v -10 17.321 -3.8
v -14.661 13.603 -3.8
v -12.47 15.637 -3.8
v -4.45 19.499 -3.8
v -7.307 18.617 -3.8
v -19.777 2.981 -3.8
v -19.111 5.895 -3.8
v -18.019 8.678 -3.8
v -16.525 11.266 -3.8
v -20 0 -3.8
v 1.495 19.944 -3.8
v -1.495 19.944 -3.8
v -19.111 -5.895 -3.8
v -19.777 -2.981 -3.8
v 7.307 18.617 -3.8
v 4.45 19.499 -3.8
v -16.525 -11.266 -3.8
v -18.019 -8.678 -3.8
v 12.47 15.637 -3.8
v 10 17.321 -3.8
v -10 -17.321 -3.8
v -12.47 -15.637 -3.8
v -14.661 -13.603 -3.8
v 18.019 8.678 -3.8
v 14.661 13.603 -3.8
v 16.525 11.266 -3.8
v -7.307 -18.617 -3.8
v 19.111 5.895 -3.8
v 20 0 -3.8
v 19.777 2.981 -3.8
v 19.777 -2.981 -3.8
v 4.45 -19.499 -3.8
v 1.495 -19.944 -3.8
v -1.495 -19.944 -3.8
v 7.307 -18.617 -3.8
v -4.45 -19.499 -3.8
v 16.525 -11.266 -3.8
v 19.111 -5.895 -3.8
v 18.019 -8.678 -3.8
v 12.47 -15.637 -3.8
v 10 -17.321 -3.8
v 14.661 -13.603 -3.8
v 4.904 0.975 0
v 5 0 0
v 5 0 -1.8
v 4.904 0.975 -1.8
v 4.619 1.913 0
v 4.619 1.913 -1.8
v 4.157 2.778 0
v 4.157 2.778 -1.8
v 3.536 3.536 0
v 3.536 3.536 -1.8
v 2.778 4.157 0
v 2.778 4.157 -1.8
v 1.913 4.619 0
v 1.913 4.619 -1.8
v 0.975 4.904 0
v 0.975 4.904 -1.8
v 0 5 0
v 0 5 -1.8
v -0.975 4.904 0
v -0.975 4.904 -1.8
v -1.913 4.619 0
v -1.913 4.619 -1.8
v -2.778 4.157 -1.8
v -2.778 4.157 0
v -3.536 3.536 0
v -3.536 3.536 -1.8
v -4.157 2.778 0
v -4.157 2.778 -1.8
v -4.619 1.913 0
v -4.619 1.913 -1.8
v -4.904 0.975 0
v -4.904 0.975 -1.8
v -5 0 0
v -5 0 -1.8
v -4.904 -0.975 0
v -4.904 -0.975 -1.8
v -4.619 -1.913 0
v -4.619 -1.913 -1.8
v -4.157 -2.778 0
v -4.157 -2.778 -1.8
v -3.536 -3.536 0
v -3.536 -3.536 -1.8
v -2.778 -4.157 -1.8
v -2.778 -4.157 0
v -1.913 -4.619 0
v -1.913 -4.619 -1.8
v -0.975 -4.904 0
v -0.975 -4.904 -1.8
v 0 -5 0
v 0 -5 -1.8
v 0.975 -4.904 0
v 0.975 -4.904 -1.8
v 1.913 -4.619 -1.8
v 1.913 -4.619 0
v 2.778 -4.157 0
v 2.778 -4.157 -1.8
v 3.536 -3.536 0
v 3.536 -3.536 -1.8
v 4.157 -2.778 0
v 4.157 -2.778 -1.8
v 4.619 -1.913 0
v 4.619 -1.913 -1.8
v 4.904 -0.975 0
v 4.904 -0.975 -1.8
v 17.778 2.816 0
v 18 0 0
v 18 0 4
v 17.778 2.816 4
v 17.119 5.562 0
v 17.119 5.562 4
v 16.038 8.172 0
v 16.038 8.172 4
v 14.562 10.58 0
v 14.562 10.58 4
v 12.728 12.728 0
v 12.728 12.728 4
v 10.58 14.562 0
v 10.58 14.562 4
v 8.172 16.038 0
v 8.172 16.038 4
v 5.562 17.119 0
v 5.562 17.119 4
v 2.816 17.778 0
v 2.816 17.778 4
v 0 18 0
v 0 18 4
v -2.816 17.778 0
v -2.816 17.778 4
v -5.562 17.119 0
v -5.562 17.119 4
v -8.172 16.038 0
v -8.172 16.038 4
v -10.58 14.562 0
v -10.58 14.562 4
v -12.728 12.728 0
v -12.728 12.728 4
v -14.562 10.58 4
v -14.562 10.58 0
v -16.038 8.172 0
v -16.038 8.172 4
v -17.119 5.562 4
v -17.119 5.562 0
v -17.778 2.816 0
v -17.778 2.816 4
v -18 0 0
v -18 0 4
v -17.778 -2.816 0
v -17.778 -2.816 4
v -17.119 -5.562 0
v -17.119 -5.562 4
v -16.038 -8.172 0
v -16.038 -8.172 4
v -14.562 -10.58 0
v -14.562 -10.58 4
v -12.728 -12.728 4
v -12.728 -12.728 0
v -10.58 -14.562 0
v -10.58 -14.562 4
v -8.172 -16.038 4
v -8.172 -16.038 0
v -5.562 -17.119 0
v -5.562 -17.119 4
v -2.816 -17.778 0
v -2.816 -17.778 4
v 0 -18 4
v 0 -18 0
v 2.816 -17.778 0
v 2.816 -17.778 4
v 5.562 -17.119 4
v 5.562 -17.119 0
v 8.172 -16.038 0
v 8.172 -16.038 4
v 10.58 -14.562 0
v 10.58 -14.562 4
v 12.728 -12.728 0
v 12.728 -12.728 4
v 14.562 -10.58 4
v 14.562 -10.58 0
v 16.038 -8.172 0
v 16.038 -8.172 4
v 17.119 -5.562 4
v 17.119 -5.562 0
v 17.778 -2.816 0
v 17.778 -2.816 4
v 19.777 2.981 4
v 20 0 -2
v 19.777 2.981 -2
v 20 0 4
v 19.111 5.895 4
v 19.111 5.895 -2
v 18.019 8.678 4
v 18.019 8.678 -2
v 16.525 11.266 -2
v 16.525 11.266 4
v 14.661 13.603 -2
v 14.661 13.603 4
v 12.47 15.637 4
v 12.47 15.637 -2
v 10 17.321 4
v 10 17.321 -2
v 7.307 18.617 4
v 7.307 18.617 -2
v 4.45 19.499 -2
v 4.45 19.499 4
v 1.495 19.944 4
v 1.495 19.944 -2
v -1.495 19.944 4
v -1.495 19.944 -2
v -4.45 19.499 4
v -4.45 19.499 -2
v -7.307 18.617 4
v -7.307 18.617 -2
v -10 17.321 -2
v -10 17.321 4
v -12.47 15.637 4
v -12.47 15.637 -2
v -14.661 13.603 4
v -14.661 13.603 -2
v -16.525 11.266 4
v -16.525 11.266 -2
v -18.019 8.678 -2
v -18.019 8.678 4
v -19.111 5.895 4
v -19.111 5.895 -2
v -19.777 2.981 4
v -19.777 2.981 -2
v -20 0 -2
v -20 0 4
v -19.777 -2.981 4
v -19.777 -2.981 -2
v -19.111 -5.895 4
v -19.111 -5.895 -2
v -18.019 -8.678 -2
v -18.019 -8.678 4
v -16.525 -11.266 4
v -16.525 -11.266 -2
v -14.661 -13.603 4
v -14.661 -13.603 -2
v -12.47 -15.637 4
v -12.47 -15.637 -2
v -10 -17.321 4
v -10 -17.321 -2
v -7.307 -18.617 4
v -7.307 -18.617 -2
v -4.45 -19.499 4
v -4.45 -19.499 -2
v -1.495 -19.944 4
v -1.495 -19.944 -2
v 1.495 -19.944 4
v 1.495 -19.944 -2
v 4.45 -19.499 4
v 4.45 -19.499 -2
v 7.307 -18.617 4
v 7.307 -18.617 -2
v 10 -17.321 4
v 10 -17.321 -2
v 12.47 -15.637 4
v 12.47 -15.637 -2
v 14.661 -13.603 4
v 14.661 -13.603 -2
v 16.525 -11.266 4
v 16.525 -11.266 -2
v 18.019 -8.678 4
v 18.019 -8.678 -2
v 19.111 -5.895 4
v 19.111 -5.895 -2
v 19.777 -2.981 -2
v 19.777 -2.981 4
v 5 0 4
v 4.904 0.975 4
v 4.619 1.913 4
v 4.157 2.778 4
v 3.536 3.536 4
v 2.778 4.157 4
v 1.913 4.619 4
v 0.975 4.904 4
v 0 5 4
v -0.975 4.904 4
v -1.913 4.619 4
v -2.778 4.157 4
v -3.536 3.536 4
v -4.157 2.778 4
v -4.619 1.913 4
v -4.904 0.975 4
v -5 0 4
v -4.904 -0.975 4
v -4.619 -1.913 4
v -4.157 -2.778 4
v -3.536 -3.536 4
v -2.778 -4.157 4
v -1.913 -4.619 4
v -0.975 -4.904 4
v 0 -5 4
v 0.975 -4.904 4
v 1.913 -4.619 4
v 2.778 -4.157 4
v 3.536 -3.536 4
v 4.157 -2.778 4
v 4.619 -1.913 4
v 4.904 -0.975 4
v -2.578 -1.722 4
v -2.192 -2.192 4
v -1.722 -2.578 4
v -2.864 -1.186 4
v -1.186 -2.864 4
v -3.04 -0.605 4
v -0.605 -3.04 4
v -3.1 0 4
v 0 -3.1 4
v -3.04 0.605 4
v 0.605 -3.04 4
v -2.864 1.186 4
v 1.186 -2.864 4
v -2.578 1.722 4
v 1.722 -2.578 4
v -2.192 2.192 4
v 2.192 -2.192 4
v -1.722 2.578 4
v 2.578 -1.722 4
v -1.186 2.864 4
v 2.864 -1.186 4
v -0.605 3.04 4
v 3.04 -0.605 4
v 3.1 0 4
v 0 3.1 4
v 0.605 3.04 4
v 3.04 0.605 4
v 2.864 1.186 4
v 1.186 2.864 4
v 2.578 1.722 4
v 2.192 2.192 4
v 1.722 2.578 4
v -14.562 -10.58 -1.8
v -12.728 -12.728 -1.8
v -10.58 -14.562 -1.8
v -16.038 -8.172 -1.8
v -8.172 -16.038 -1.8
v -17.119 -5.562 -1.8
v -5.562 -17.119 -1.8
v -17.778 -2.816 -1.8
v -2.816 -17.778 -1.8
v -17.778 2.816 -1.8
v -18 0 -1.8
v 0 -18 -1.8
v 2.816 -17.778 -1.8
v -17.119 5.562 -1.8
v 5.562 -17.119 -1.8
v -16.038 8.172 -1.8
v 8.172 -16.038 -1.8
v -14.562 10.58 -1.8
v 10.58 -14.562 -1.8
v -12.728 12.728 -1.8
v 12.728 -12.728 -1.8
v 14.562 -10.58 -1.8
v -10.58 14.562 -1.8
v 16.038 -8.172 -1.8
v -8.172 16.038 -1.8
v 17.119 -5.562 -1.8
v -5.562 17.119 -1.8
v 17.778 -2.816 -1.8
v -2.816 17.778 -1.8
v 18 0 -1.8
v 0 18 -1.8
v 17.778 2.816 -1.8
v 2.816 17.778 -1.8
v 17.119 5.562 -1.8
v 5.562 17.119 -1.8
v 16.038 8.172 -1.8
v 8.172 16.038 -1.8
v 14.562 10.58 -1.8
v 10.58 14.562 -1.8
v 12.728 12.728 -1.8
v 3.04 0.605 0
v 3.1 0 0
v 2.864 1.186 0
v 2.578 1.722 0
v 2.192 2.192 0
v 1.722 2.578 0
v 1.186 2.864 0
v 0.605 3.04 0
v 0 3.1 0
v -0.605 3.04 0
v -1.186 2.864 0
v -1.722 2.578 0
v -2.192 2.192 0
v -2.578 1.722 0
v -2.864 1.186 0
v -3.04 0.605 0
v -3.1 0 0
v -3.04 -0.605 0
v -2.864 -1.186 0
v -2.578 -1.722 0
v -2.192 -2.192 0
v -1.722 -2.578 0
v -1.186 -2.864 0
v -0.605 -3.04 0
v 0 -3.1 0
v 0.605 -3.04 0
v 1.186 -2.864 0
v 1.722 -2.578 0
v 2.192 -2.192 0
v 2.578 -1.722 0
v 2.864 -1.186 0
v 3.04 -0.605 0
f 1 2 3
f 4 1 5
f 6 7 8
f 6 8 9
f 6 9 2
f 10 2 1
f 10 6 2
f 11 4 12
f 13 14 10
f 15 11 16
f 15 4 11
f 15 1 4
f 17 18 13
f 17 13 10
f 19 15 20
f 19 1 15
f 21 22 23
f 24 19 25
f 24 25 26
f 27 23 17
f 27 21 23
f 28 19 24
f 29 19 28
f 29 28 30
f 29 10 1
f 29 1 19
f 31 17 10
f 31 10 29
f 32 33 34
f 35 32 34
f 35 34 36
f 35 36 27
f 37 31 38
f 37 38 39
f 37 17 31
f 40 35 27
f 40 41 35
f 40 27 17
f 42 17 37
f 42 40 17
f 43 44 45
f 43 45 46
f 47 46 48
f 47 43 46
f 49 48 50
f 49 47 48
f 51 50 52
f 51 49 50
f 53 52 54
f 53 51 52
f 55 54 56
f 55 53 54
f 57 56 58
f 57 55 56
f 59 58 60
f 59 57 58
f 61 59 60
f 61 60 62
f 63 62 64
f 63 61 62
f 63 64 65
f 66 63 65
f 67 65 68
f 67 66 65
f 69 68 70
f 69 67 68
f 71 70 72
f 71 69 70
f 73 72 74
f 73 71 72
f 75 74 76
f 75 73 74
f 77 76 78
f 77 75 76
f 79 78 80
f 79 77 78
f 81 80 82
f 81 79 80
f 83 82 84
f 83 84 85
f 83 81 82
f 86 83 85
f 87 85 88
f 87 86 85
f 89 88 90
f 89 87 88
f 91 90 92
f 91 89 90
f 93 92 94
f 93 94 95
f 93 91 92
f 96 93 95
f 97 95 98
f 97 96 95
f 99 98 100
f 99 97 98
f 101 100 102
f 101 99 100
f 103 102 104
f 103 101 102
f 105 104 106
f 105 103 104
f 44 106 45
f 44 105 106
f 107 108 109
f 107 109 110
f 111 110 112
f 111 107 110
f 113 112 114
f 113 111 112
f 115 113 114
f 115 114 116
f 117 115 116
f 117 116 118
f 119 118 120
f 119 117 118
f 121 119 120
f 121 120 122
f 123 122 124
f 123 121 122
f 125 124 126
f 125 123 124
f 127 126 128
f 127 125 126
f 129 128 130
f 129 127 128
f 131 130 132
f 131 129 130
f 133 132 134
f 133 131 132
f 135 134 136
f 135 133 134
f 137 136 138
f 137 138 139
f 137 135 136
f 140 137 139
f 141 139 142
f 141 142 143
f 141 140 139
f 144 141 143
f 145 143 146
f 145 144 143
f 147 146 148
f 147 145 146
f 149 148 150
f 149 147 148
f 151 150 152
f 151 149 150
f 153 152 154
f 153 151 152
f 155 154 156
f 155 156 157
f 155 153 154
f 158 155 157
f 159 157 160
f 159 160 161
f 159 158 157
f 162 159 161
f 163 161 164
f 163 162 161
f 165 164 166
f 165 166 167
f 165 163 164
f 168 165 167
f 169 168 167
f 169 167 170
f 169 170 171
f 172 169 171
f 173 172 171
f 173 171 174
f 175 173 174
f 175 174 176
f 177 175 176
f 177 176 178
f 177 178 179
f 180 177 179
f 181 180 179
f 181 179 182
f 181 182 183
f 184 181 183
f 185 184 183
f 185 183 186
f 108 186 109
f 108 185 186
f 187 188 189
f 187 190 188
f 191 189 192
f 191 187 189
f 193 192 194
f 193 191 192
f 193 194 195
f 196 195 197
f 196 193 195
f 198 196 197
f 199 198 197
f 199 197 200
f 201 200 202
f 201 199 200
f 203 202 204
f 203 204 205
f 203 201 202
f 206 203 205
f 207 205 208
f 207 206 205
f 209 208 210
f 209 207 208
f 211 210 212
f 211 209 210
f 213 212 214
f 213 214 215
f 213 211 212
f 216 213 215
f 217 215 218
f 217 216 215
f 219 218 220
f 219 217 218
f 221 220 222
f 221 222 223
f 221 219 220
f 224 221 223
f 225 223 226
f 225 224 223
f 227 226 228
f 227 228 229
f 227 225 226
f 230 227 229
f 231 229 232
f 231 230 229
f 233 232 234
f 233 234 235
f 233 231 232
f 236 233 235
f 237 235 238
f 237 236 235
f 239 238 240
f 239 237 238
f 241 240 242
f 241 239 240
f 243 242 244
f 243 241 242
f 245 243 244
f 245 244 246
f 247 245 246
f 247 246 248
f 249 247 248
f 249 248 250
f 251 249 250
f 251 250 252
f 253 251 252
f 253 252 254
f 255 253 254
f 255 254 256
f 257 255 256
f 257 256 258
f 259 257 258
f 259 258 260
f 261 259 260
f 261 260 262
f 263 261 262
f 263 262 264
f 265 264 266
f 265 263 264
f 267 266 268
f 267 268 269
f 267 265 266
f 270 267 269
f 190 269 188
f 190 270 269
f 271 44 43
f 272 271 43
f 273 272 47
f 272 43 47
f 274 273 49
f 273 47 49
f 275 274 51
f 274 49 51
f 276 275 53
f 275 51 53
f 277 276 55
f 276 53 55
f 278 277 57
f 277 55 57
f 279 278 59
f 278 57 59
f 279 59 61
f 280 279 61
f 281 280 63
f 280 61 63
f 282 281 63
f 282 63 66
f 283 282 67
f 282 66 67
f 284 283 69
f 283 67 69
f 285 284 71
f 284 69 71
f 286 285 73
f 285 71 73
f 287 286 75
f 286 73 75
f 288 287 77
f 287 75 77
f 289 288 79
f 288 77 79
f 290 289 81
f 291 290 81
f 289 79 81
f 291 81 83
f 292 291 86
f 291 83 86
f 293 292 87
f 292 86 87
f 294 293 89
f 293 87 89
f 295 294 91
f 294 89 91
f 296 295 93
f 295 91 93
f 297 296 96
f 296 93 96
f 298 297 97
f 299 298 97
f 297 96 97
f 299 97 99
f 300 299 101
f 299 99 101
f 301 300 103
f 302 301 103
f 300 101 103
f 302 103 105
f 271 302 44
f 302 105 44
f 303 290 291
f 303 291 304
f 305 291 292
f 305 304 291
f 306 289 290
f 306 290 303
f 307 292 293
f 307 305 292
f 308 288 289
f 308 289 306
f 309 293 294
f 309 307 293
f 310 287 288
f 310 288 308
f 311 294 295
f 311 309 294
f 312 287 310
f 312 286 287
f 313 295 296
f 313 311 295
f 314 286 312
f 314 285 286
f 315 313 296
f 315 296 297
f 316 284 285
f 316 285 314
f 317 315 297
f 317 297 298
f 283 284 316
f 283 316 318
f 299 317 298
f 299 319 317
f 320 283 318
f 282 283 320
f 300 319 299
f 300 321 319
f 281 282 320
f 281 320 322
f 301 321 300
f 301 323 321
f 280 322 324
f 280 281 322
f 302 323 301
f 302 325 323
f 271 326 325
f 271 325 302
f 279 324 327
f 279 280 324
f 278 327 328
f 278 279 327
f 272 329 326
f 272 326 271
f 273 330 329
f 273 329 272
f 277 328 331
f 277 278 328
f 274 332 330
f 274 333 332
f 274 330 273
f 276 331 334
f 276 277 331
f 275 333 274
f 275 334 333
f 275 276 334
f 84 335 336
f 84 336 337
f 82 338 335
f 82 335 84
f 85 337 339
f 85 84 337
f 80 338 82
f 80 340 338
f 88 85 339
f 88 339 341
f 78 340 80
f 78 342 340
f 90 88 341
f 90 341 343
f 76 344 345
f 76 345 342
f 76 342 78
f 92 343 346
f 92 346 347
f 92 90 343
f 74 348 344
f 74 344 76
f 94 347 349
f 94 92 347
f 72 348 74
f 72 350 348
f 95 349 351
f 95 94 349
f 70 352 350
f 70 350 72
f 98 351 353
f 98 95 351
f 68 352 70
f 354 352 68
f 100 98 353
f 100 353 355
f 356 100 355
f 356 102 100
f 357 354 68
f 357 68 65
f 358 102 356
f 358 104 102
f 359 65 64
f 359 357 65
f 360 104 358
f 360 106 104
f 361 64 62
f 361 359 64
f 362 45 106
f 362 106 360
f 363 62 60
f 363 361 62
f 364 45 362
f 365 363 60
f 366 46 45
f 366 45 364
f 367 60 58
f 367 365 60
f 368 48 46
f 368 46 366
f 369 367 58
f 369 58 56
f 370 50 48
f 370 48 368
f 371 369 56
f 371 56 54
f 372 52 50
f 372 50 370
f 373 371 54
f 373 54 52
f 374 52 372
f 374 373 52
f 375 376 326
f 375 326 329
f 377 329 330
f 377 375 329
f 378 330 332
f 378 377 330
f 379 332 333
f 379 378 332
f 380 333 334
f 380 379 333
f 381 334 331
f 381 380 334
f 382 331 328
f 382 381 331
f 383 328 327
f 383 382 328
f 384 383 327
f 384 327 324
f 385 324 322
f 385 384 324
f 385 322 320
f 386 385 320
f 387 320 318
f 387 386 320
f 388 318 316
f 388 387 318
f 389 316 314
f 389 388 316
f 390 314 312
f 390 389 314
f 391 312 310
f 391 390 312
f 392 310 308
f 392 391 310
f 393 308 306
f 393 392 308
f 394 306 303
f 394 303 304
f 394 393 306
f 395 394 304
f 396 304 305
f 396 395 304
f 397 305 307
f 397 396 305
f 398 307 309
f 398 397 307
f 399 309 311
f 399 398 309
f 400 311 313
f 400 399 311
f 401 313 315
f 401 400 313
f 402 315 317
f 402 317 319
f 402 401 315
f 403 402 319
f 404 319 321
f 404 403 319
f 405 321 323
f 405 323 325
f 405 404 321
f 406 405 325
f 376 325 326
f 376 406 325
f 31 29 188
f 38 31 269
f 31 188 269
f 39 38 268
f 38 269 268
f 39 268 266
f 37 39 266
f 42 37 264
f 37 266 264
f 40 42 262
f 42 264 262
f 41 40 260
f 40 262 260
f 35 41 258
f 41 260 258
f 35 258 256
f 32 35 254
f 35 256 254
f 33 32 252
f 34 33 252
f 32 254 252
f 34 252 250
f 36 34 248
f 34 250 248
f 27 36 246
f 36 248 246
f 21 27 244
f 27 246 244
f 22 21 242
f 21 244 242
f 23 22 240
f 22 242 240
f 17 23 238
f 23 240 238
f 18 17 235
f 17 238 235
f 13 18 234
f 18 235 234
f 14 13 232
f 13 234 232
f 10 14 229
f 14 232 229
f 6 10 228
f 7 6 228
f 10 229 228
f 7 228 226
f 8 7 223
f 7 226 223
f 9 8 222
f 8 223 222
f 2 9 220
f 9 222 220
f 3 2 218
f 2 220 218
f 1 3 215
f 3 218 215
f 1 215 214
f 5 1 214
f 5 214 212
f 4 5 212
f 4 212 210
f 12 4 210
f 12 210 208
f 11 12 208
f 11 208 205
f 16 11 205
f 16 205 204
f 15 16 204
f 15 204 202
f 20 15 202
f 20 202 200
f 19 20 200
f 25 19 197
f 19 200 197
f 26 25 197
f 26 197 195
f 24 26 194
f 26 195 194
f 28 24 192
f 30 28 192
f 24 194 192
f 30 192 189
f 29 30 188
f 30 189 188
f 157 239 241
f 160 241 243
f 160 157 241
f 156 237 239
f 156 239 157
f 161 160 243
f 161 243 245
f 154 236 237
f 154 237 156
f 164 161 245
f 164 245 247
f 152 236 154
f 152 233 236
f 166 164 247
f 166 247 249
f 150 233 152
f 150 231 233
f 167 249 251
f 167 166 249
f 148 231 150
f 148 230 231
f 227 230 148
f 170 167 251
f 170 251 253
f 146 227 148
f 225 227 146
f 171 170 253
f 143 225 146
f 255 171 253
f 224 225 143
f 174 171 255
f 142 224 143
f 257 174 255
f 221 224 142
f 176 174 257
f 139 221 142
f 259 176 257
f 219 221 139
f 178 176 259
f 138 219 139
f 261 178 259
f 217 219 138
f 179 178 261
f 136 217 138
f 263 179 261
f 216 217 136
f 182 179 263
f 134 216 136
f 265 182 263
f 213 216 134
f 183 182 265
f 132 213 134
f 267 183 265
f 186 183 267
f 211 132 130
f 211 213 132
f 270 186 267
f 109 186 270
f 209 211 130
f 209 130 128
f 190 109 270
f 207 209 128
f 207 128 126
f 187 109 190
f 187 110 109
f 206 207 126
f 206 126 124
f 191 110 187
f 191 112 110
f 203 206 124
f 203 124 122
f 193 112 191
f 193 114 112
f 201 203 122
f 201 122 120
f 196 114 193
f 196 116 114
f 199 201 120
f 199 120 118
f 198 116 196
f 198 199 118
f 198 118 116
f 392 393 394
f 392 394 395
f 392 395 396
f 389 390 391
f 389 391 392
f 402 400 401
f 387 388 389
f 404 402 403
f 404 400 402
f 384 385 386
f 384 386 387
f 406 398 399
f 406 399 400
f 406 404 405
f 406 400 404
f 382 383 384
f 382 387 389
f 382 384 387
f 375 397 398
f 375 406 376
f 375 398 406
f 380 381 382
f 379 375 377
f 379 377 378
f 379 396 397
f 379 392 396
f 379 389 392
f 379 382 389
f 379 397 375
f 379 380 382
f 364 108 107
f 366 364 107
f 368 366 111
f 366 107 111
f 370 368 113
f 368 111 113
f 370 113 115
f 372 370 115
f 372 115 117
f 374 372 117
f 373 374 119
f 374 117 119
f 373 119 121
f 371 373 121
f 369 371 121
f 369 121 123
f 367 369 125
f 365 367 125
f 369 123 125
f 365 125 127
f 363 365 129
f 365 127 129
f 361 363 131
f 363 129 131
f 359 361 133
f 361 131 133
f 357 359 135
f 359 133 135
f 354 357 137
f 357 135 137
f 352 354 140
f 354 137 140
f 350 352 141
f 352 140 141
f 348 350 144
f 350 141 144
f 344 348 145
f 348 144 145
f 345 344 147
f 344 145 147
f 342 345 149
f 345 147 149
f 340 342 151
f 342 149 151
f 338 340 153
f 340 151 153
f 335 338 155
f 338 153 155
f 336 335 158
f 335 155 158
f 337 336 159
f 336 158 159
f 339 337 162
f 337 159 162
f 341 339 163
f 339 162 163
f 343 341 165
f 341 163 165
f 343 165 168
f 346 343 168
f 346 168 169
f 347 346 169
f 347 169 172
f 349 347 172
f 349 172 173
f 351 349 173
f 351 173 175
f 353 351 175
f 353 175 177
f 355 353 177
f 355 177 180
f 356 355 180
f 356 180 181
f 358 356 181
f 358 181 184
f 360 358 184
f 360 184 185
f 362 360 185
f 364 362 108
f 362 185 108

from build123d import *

# Parameters (mm, degrees)
SKETCH_1_R          = 5
SKETCH_1_R_2        = 3.1
EXTRUDE_1_DEPTH     = 4
SKETCH_1_3_R        = 20
SKETCH_1_3_R_2      = 18
EXTRUDE_2_DEPTH     = 4
SKETCH_1_4_R        = 20
EXTRUDE_3_DEPTH     = 2
SKETCH_2_R          = 20
EXTRUDE_4_DEPTH     = 1.8
CUT_EXTRUDE_START   = -1.8
SKETCH_4_R          = 18
SKETCH_4_R_2        = 5
CUT_EXTRUDE_1_DEPTH = 1.8


with BuildPart() as part:
    # 草图1 → 凸台-拉伸1 (new body)
    with BuildSketch(Plane.XY):
        Circle(SKETCH_1_R)
        Circle(SKETCH_1_R_2, mode=Mode.SUBTRACT)
    extrude(amount=EXTRUDE_1_DEPTH)



with BuildPart() as body_2:
    # 草图1<3> → 凸台-拉伸2 (new body)
    with BuildSketch(Plane.XY):
        Circle(SKETCH_1_3_R)
        Circle(SKETCH_1_3_R_2, mode=Mode.SUBTRACT)
    extrude(amount=EXTRUDE_2_DEPTH)


with BuildPart() as part_1:
    add(part.part)

    add(body_2.part)  # 凸台-拉伸3 merges body 2
    # 草图1<4> → 凸台-拉伸3 (add)
    with BuildSketch(Plane.XY):
        Circle(SKETCH_1_4_R)
    extrude(amount=-EXTRUDE_3_DEPTH)

    # 草图2 → 凸台-拉伸4 (add)
    with BuildSketch(Plane(origin=(0, 0, -2), x_dir=(-1, 0, 0), z_dir=(0, 0, -1))):
        Circle(SKETCH_2_R)
    extrude(amount=EXTRUDE_4_DEPTH)

    # 草图4 → 切除-拉伸1 (cut)
    with BuildSketch(Plane.XY.offset(CUT_EXTRUDE_START)):
        Circle(SKETCH_4_R)
        Circle(SKETCH_4_R_2, mode=Mode.SUBTRACT)
    extrude(amount=CUT_EXTRUDE_1_DEPTH, mode=Mode.SUBTRACT)


solid = part_1.part
